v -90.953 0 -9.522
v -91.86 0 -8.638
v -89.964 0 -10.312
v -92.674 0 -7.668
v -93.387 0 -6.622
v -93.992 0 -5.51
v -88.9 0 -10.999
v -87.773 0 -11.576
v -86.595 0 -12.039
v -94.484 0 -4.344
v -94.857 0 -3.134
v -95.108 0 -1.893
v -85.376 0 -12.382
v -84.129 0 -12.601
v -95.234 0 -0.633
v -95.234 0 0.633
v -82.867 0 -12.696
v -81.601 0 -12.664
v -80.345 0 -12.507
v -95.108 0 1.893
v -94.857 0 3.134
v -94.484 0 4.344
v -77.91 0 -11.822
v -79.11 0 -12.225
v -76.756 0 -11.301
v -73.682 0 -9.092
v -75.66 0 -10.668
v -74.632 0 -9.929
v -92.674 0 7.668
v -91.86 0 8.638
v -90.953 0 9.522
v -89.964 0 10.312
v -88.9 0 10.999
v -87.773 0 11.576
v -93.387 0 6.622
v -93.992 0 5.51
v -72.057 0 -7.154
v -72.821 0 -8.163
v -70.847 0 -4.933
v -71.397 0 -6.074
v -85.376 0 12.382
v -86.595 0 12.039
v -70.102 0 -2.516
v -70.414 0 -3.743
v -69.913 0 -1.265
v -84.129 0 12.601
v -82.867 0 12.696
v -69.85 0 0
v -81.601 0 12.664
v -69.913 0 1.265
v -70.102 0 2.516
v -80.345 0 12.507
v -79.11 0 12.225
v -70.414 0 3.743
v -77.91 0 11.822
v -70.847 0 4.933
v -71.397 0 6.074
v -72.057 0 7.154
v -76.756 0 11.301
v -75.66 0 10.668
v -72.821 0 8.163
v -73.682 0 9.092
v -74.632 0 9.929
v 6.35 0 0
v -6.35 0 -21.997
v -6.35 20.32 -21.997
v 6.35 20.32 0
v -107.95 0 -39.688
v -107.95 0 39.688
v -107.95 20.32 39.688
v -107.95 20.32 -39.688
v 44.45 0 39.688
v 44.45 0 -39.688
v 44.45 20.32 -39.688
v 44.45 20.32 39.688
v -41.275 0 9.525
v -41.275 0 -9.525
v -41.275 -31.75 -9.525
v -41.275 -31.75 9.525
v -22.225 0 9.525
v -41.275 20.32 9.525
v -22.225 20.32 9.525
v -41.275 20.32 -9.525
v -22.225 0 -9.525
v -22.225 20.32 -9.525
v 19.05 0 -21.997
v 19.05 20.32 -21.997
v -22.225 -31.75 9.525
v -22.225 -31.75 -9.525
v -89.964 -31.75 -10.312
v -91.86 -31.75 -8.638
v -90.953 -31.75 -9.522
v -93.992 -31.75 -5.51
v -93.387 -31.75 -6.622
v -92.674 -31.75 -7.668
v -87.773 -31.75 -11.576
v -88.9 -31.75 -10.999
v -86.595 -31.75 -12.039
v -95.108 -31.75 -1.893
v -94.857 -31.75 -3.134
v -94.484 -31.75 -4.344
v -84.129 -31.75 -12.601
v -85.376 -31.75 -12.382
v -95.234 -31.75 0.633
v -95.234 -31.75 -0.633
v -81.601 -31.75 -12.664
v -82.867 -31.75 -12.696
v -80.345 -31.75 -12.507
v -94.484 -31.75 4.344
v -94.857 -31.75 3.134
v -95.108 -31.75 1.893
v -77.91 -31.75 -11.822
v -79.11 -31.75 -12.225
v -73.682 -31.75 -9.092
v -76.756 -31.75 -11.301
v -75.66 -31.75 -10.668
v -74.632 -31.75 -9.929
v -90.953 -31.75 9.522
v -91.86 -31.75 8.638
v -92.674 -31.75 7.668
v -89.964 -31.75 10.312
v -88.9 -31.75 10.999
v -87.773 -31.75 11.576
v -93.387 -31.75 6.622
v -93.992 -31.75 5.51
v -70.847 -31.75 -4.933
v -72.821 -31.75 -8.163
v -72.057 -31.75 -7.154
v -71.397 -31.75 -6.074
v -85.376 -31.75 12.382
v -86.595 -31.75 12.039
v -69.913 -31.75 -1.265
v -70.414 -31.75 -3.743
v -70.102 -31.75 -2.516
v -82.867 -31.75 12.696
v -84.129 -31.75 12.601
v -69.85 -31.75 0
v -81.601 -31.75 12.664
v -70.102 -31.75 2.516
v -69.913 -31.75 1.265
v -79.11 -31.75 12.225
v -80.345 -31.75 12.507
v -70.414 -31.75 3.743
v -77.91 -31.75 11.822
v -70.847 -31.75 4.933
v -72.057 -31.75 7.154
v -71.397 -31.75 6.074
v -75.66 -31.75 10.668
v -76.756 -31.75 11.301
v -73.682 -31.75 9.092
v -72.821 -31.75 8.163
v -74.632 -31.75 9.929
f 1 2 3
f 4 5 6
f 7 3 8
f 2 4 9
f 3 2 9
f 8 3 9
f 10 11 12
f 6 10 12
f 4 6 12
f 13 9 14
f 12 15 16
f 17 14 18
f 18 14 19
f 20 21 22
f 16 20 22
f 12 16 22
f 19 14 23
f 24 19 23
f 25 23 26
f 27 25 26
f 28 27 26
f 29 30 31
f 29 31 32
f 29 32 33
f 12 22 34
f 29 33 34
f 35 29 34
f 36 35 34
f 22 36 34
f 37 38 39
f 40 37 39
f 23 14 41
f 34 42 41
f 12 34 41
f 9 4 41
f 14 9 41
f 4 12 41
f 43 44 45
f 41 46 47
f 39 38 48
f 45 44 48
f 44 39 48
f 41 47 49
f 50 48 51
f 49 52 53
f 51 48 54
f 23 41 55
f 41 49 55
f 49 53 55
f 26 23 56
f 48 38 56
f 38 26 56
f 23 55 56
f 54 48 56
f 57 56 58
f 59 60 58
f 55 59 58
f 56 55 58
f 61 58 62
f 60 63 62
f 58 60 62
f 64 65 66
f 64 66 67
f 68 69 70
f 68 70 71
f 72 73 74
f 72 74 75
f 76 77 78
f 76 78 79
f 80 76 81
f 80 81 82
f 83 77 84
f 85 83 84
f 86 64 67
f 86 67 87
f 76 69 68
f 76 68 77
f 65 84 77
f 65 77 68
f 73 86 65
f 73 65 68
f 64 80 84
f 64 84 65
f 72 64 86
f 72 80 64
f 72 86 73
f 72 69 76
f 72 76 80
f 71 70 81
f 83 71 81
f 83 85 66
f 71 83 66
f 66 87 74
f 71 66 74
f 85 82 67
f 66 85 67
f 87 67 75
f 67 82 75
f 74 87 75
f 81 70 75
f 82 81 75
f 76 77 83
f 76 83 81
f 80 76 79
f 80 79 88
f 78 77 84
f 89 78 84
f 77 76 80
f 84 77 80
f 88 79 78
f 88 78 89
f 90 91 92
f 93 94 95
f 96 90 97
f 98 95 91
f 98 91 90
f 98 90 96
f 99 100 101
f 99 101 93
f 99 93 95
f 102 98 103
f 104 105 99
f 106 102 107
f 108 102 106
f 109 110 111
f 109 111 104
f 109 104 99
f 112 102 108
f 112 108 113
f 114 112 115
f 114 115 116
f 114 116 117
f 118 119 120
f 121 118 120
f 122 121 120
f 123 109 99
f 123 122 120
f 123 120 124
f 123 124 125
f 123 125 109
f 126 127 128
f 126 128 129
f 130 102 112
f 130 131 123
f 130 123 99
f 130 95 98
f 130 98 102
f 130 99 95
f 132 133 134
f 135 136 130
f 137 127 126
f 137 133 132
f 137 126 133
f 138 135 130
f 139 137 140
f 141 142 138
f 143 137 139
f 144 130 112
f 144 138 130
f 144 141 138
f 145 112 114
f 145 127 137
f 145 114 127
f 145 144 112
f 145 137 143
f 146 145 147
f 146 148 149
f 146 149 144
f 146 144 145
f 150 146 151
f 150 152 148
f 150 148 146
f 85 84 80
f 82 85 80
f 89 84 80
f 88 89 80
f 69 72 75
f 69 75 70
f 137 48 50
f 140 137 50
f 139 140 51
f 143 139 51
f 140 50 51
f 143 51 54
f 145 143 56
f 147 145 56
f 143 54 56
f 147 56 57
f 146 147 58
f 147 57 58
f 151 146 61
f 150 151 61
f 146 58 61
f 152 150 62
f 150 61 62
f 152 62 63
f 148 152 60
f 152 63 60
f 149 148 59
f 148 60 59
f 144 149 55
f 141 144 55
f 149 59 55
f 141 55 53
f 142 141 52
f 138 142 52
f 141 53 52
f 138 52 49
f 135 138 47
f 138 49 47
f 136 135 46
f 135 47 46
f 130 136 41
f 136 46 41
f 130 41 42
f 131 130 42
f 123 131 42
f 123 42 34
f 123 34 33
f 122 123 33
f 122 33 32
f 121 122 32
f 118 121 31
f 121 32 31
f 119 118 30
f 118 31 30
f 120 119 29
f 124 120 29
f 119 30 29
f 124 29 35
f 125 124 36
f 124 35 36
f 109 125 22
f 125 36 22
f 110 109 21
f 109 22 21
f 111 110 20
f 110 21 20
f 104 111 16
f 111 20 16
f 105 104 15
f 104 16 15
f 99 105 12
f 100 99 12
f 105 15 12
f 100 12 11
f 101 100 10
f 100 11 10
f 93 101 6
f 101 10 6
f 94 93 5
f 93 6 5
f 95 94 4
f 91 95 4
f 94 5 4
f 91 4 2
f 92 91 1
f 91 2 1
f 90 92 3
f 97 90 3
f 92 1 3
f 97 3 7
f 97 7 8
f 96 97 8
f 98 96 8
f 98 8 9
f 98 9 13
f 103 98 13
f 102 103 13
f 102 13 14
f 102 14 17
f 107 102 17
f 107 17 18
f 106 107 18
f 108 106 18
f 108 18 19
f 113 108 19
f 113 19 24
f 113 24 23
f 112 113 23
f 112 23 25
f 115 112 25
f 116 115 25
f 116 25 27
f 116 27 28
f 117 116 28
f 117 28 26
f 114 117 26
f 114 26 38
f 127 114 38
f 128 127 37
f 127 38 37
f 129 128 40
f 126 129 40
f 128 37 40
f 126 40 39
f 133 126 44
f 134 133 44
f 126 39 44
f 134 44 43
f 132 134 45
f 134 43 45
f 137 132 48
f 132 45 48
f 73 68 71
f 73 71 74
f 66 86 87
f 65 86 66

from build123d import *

# Parameters (mm, degrees)
F0_R     = 12.7
F0_W     = 19.05
F0_H     = 19.05
F1_DEPTH = 20.32
F2_DEPTH = 31.75


with BuildPart() as f1:
    # F0 (on Front) → F1 (new body)
    with BuildSketch(Plane.XZ):
        Polygon((44.45, -39.6875), (44.45, 0), (44.45, 39.6875), (-107.95, 39.6875), (-107.95, -39.6875), align=None)
        Polygon((-6.35, -21.997045), (6.35, 0), (19.05, -21.997045), align=None, mode=Mode.SUBTRACT)
        with Locations((-82.55, 0)):
            Circle(F0_R, mode=Mode.SUBTRACT)
        with Locations((-31.75, 0)):
            Rectangle(F0_W, F0_H, mode=Mode.SUBTRACT)
        with Locations((-82.55, 0)):
            Circle(F0_R)
    extrude(amount=-F1_DEPTH)


with BuildPart() as f2:
    # F0 (on Front) → F2 (new body)
    with BuildSketch(Plane.XZ):
        with Locations((-82.55, 0)):
            Circle(F0_R)
        with Locations((-31.75, 0)):
            Rectangle(F0_W, F0_H)
    extrude(amount=F2_DEPTH)


solid = Compound([f1.part, f2.part])
